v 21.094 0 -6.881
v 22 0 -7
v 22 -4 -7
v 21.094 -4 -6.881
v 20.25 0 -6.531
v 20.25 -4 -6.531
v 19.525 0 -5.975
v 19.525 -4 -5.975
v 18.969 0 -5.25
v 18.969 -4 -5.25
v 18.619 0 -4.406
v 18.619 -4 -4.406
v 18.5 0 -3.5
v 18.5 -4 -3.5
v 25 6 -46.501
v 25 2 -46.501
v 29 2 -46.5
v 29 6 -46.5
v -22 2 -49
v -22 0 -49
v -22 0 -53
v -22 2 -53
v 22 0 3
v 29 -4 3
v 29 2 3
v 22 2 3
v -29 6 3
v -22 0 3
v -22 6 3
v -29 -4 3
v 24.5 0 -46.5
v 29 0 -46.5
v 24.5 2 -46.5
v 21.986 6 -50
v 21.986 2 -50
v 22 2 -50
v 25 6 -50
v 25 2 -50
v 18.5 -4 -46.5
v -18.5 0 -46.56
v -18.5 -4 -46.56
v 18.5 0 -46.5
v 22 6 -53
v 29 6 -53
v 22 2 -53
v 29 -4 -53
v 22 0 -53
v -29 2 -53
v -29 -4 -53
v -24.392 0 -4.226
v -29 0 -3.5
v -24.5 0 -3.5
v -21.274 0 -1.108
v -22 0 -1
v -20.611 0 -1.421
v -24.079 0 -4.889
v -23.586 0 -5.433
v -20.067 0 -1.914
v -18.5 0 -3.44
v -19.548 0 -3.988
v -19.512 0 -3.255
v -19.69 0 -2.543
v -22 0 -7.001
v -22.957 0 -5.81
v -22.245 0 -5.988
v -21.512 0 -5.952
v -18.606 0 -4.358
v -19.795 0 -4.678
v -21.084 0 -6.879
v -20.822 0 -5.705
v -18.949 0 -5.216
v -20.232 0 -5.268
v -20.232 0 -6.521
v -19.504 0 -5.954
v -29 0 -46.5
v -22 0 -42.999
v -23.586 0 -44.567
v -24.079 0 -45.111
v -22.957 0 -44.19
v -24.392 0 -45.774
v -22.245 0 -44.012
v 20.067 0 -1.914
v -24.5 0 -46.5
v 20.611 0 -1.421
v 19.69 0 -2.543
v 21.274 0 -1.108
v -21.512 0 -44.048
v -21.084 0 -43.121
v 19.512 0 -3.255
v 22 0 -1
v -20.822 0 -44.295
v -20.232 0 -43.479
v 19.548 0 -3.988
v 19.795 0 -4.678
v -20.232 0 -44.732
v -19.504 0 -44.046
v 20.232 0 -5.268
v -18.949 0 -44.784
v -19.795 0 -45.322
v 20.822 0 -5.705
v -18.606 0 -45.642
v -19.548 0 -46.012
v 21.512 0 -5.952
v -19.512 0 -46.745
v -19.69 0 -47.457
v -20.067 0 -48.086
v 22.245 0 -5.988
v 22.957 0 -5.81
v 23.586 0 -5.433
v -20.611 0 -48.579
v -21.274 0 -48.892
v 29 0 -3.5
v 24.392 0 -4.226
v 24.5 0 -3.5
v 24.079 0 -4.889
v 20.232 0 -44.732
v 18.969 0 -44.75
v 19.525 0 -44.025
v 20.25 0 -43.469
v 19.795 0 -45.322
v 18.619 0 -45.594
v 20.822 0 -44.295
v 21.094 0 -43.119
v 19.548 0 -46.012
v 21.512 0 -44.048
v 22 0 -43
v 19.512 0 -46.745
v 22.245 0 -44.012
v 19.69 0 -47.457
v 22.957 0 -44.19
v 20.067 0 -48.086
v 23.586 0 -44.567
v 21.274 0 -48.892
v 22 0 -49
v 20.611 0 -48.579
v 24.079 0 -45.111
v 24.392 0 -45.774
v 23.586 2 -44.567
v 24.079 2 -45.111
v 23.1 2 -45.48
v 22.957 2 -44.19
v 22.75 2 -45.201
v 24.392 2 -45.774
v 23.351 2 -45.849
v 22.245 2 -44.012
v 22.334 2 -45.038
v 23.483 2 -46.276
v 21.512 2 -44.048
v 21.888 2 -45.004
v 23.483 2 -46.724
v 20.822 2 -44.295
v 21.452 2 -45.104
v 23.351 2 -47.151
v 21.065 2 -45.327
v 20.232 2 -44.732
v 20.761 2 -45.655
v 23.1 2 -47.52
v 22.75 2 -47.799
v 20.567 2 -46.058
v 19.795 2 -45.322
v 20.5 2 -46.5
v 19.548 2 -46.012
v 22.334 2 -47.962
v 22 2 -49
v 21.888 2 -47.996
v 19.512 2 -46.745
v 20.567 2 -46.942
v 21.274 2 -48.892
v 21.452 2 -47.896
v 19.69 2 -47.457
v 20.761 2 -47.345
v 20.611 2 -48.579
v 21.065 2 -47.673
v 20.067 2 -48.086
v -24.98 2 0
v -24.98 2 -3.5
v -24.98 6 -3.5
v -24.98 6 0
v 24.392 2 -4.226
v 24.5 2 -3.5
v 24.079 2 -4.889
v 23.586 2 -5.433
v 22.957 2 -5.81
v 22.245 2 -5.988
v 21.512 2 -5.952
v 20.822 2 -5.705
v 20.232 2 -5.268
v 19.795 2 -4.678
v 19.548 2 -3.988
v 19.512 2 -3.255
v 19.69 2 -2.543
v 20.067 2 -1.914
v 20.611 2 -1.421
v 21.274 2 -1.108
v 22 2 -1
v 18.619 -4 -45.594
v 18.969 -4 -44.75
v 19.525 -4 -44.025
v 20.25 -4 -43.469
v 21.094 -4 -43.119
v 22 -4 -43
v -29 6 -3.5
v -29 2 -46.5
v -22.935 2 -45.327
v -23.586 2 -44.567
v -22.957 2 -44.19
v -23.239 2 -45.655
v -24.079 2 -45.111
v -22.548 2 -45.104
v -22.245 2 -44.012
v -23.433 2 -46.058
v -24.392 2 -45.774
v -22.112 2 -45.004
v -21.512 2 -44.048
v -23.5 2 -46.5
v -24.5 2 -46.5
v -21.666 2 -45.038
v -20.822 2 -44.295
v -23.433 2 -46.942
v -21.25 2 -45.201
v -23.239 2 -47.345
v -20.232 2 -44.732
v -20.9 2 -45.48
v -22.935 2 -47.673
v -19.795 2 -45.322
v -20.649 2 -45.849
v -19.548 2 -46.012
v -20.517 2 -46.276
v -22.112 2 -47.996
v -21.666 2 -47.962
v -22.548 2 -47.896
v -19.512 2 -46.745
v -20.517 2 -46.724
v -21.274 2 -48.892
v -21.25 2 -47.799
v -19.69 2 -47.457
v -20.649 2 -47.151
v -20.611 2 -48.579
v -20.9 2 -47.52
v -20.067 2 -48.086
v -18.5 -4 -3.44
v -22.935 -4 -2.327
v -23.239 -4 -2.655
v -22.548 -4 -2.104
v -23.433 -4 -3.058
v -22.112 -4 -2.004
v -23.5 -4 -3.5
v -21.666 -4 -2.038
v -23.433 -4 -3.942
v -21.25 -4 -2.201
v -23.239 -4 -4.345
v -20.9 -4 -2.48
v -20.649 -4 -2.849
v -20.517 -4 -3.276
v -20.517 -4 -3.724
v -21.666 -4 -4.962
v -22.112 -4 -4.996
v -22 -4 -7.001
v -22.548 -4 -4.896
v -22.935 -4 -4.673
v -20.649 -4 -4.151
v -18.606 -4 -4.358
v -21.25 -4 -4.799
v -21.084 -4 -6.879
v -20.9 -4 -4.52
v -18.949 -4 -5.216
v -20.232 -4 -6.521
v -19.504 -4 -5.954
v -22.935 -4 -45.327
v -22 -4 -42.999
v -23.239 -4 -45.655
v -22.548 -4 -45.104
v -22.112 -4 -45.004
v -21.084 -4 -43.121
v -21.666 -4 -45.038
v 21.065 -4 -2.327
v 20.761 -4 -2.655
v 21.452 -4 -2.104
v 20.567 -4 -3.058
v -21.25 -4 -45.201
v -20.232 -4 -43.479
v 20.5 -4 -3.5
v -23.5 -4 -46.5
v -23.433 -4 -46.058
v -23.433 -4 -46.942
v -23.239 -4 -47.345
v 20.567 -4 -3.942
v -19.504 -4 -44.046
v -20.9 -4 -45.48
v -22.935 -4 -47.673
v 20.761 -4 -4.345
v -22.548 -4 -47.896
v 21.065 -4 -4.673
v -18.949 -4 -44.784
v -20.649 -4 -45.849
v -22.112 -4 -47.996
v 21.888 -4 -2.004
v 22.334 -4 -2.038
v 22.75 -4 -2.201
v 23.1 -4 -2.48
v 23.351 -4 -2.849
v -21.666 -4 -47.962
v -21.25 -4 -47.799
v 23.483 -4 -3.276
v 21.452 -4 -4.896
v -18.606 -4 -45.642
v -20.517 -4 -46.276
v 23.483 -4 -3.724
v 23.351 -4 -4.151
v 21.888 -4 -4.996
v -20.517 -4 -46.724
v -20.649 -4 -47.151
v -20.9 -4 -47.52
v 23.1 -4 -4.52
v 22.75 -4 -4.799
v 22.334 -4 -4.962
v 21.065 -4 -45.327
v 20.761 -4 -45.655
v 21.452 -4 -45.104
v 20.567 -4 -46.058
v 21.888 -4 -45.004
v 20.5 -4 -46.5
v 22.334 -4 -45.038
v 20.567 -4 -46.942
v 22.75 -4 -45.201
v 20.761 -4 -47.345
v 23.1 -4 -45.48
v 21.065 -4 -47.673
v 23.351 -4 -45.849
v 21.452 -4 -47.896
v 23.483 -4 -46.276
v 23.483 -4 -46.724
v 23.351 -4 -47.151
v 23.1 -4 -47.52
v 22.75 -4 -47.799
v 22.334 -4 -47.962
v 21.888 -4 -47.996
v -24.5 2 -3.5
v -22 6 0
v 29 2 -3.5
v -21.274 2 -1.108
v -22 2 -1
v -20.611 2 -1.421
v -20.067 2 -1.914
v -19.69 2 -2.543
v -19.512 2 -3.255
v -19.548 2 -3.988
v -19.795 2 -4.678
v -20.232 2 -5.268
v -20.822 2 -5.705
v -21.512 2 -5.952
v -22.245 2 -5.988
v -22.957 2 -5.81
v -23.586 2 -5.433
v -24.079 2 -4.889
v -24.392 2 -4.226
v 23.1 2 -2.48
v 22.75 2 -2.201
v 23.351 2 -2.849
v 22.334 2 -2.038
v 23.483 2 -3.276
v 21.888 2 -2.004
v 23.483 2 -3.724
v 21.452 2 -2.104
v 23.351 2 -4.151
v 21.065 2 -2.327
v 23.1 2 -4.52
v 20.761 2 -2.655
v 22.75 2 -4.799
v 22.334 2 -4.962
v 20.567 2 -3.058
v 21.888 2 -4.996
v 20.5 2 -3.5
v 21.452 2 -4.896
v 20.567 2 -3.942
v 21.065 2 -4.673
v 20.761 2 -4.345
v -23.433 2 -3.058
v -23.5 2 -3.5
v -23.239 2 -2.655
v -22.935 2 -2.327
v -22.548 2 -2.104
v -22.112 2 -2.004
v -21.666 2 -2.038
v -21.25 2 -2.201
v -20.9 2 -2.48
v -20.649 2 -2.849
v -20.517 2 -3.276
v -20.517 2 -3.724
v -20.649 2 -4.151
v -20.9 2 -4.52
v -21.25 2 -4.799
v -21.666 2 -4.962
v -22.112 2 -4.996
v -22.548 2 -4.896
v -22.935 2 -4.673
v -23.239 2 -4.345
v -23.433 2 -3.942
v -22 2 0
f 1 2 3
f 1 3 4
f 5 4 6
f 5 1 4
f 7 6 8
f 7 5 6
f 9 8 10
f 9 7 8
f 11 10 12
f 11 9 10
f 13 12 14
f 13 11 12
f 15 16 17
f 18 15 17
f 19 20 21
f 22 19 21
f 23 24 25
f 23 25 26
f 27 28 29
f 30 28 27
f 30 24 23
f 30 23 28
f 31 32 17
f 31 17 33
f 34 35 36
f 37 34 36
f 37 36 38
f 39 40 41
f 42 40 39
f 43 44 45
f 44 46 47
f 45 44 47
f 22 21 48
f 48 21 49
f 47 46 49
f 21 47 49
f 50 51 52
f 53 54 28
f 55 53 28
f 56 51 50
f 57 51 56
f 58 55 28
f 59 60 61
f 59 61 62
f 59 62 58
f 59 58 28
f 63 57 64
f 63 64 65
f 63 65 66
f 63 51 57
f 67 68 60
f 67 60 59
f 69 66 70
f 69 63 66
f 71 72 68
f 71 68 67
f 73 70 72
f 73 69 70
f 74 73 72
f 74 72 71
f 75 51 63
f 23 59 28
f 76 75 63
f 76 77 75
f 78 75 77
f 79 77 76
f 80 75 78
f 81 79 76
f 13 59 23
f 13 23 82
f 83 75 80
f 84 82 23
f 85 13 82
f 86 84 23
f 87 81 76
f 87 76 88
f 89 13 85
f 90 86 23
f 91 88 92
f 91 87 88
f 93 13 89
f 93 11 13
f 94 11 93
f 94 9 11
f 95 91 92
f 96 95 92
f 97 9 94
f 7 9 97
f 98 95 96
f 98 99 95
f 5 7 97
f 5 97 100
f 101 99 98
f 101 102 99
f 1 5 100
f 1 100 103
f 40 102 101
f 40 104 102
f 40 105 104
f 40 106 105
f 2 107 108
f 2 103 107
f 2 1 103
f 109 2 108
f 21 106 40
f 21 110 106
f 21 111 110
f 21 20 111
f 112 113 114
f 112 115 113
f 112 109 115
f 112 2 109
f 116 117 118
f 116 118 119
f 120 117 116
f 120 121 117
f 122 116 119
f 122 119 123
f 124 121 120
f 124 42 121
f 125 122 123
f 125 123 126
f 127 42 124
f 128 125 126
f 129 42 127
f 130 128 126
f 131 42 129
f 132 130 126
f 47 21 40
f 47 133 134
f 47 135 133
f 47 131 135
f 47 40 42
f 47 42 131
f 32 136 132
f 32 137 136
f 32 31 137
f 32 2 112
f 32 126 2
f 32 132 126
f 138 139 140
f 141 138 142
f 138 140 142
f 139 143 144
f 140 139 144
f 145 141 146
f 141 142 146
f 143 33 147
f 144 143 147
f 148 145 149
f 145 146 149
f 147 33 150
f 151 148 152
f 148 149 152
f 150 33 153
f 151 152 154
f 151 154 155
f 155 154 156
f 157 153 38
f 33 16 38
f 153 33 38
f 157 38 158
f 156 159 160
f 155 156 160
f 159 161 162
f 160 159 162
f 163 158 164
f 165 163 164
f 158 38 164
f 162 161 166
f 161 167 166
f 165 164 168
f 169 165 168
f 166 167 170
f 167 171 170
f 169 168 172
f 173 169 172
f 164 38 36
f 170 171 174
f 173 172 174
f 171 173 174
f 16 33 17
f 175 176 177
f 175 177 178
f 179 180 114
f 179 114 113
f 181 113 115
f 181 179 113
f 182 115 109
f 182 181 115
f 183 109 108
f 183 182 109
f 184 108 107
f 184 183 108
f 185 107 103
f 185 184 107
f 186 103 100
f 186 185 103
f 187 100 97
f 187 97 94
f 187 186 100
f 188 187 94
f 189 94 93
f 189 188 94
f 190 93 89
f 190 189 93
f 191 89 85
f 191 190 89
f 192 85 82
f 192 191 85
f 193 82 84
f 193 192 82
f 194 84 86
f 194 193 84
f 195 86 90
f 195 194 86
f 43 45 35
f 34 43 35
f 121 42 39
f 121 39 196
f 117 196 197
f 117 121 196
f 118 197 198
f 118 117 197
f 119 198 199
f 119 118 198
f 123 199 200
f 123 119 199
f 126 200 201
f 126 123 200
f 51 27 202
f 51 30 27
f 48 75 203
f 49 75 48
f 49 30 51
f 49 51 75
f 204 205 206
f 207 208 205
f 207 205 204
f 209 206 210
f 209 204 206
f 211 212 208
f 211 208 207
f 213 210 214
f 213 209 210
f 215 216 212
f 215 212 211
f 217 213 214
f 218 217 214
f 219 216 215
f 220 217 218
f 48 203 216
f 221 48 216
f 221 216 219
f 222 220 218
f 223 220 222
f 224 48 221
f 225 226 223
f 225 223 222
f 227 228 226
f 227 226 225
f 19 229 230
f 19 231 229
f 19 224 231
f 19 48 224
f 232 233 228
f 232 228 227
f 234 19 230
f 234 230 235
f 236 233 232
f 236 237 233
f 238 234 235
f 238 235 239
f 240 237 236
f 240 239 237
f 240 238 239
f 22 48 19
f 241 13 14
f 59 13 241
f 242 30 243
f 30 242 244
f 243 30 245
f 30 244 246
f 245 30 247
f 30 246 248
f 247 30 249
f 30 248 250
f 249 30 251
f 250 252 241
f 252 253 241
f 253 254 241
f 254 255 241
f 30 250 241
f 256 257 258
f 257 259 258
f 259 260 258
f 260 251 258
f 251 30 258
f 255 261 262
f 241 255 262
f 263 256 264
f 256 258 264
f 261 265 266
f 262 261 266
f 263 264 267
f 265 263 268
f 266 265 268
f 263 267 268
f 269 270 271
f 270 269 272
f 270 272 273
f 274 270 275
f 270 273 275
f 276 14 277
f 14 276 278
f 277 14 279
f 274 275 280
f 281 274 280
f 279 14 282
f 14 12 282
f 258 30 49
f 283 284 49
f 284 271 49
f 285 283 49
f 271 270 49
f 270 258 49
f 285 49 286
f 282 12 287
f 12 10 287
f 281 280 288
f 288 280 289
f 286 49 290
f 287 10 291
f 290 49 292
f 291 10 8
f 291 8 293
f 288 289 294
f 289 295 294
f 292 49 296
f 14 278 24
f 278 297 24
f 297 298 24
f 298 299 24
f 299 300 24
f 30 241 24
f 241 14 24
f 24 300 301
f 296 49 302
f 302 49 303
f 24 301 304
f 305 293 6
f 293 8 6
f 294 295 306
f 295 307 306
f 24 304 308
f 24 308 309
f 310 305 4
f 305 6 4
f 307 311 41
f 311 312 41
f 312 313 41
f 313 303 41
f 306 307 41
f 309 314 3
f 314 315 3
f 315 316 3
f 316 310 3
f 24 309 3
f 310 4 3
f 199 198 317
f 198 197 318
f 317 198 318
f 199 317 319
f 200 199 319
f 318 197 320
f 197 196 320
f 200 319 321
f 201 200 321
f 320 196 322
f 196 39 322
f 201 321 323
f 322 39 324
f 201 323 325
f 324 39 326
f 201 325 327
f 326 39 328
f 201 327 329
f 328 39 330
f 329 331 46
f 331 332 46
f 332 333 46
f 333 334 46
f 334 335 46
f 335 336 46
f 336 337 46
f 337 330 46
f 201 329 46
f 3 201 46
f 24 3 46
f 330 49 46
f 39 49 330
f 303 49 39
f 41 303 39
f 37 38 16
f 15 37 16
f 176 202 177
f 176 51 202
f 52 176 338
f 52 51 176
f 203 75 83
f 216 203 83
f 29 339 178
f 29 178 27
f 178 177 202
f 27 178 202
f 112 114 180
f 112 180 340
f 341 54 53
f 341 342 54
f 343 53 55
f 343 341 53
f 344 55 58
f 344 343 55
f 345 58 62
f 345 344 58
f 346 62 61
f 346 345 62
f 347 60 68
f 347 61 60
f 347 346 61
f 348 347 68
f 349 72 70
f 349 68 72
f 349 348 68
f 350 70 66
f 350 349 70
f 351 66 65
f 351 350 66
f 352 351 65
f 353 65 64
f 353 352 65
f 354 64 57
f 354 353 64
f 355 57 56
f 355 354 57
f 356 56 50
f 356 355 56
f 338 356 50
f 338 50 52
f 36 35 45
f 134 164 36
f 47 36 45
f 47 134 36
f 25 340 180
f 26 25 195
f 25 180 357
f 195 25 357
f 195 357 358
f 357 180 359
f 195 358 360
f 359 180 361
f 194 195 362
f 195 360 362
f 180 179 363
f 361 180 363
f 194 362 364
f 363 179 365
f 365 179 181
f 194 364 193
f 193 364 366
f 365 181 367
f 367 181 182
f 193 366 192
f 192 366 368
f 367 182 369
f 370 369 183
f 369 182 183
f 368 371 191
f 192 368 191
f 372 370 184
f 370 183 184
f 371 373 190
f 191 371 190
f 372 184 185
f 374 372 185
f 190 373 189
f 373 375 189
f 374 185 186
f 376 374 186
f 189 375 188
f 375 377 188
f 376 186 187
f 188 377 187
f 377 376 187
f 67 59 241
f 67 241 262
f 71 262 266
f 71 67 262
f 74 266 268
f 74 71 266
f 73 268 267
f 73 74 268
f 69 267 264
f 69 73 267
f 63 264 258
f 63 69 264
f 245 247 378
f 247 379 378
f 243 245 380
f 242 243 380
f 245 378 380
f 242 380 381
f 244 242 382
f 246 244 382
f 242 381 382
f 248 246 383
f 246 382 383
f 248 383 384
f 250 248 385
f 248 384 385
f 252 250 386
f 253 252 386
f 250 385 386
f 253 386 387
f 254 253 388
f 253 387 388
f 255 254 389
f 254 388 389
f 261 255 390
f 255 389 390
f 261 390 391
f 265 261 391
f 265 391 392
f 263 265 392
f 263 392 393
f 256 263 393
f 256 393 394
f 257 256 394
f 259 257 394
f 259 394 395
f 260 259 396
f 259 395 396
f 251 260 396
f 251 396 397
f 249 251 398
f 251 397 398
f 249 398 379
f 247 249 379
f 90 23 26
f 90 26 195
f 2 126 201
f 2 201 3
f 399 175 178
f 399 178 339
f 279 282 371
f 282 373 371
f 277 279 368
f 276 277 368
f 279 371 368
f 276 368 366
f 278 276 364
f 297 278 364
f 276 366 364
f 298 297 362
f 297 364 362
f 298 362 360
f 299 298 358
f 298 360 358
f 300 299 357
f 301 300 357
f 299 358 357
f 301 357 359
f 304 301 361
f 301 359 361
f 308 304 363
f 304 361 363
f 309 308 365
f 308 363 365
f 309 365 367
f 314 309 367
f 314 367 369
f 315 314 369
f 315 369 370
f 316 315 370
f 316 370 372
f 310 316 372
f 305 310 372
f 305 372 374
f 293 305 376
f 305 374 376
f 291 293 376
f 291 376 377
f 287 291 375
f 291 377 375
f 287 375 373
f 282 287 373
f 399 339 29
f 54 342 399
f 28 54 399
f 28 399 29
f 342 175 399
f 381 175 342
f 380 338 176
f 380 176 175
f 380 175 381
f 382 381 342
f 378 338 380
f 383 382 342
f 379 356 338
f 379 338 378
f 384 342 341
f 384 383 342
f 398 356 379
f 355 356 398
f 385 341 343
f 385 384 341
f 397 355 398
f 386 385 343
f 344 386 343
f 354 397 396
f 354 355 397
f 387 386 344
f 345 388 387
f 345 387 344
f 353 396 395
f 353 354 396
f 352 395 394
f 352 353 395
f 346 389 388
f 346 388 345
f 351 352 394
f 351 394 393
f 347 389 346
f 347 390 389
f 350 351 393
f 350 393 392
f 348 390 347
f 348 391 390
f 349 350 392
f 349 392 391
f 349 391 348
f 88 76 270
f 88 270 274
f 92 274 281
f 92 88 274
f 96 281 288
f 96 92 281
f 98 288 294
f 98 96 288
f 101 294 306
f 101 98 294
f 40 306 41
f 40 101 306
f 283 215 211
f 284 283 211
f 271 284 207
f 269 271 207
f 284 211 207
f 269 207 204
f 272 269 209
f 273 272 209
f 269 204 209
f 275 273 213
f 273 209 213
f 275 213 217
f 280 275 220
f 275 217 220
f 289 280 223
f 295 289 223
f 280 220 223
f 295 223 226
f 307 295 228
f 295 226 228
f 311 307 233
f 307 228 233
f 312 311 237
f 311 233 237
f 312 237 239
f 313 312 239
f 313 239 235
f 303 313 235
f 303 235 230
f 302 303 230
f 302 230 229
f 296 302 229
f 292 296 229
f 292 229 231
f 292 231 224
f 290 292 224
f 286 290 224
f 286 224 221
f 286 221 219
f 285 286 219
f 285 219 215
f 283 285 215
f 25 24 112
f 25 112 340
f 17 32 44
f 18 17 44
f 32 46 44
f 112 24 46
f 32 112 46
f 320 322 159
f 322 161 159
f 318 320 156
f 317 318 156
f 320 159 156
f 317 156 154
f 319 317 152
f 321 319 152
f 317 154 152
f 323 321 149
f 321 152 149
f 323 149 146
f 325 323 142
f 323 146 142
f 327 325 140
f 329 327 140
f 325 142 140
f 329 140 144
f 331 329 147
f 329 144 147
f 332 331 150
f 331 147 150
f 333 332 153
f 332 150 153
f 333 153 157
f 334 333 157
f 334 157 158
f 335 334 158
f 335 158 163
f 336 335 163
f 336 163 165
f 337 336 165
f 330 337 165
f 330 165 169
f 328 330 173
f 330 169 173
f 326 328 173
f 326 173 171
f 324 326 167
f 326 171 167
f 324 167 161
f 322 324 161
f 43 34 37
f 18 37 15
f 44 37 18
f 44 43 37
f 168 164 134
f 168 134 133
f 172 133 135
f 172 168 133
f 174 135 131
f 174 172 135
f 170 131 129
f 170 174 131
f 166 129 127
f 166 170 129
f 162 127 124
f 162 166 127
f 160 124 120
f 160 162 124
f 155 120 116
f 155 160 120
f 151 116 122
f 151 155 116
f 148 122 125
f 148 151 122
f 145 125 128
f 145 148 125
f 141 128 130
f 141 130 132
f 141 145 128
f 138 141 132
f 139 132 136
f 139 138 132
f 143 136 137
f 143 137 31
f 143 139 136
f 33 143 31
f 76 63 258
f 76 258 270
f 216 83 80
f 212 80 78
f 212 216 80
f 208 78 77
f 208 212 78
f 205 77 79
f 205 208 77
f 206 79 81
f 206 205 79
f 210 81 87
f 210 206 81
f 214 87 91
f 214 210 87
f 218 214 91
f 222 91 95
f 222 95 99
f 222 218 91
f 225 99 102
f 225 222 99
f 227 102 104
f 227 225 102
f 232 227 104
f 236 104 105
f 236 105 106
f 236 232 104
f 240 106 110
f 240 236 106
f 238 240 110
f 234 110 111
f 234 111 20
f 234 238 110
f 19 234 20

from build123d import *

# Parameters (mm, degrees)
EXTRUDE_1_DEPTH      = 3
EXTRUDE_1_DEPTH_BACK = 53
SKETCH_1_W           = 58
SKETCH_1_H           = 4
SKETCH_2_R           = 1.5
CUT_EXTRUDE_1_DEPTH  = 53
EXTRUDE_START        = 2
SKETCH_3_R           = 2.5
SKETCH_3_R_2         = 1.5
EXTRUDE_2_DEPTH      = 2
CUT_EXTRUDE_2_DEPTH  = 9
EXTRUDE_3_DEPTH      = 2
EXTRUDE_4_DEPTH      = 4


with BuildPart() as part:
    # 草图1 → 凸台-拉伸1 (new, two sides: drawn at the far end of the back side and taken through both)
    with BuildSketch(Plane.XY.offset(-EXTRUDE_1_DEPTH_BACK)):
        with Locations((0, -2)):
            Rectangle(SKETCH_1_W, SKETCH_1_H)
    extrude(amount=EXTRUDE_1_DEPTH + EXTRUDE_1_DEPTH_BACK)

    # 草图2 → 切除-拉伸1 (cut)
    with BuildSketch(Plane(origin=(0, 0, 0), x_dir=(1, 0, 0), z_dir=(0, 1, 0))):
        with Locations(Location((-22, 46.5, 0), (0, 0, 180))):
            Circle(SKETCH_2_R)
        with Locations(Location((22, 46.5, 0), (0, 0, 180))):
            Circle(SKETCH_2_R)
        with Locations(Location((22, 3.5, 0), (0, 0, 180))):
            Circle(SKETCH_2_R)
        with Locations(Location((-22, 3.5, 0), (0, 0, 180))):
            Circle(SKETCH_2_R)
    extrude(amount=-CUT_EXTRUDE_1_DEPTH, mode=Mode.SUBTRACT)

    # 草图3 → 凸台-拉伸2 (add)
    # profile 1 of 4: a face of its own
    with BuildSketch(Plane(origin=(0, 0, 0), x_dir=(1, 0, 0), z_dir=(0, 1, 0)).offset(EXTRUDE_START)):
        with Locations((-22, 46.5)):
            Circle(SKETCH_3_R)
        with Locations(Location((-22, 46.5, 0), (0, 0, 180))):
            Circle(SKETCH_3_R_2, mode=Mode.SUBTRACT)
    # profile 2 of 4: a face of its own
    with BuildSketch(Plane(origin=(0, 0, 0), x_dir=(1, 0, 0), z_dir=(0, 1, 0)).offset(EXTRUDE_START)):
        with Locations((22, 46.5)):
            Circle(SKETCH_3_R)
        with Locations(Location((22, 46.5, 0), (0, 0, 180))):
            Circle(SKETCH_3_R_2, mode=Mode.SUBTRACT)
    # profile 3 of 4: a face of its own
    with BuildSketch(Plane(origin=(0, 0, 0), x_dir=(1, 0, 0), z_dir=(0, 1, 0)).offset(EXTRUDE_START)):
        with Locations((22, 3.5)):
            Circle(SKETCH_3_R)
        with Locations(Location((22, 3.5, 0), (0, 0, 180))):
            Circle(SKETCH_3_R_2, mode=Mode.SUBTRACT)
    # profile 4 of 4: a face of its own
    with BuildSketch(Plane(origin=(0, 0, 0), x_dir=(1, 0, 0), z_dir=(0, 1, 0)).offset(EXTRUDE_START)):
        with Locations((-22, 3.5)):
            Circle(SKETCH_3_R)
        with Locations(Location((-22, 3.5, 0), (0, 0, 180))):
            Circle(SKETCH_3_R_2, mode=Mode.SUBTRACT)
    extrude(amount=-EXTRUDE_2_DEPTH)

    # 草图4 → 切除-拉伸2 (cut)
    with BuildSketch(Plane(origin=(0, 0, 0), x_dir=(1, 0, 0), z_dir=(0, 1, 0))):
        with BuildLine():
            Line((-18.5, 46.56), (18.5, 46.5))
            ThreePointArc((18.5, 46.5), (19.525126266, 44.025126266), (22, 43))
            Line((22, 43), (22, 7))
            ThreePointArc((22, 7), (19.525126266, 5.974873734), (18.5, 3.5))
            Line((18.5, 3.5), (-18.5, 3.44))
            ThreePointArc((-18.5, 3.44), (-19.503639564, 5.953932471), (-22, 7.000514248))
            Line((-22, 7.000514248), (-22, 42.999485752))
            ThreePointArc((-22, 42.999485752), (-19.503639564, 44.046067529), (-18.5, 46.56))
        make_face()
    extrude(amount=-CUT_EXTRUDE_2_DEPTH, mode=Mode.SUBTRACT)

    # 草图5 → 凸台-拉伸3 (add)
    with BuildSketch(Plane(origin=(0, 0, 0), x_dir=(1, 0, 0), z_dir=(0, 1, 0))):
        Polygon((-22, 49), (-22, 53), (-29, 53), (-29, 46.5), (-24.5, 46.5), align=None)
        Polygon((22, 49), (22, 53), (29, 53), (29, 46.5), (24.5, 46.5), align=None)
        Polygon((24.5, 3.5), (29, 3.5), (29, -3), (22, -3), (22, 1), align=None)
        Polygon((-24.5, 3.5), (-29, 3.5), (-29, -3), (-22, -3), (-22, 1), align=None)
    extrude(amount=EXTRUDE_3_DEPTH)

    # 草图6 → 凸台-拉伸4 (add)
    with BuildSketch(Plane(origin=(0, 2, 0), x_dir=(1, 0, 0), z_dir=(0, 1, 0))):
        Polygon((-24.979953432, 3.5), (-24.979953432, 0), (-22, 0), (-22, -3), (-29, -3), (-29, 3.5), align=None)
        Polygon((21.985616423, 50), (25, 50), (25, 46.500843785), (29, 46.5), (29, 53), (22, 53), align=None)
    extrude(amount=EXTRUDE_4_DEPTH)


solid = part.part
